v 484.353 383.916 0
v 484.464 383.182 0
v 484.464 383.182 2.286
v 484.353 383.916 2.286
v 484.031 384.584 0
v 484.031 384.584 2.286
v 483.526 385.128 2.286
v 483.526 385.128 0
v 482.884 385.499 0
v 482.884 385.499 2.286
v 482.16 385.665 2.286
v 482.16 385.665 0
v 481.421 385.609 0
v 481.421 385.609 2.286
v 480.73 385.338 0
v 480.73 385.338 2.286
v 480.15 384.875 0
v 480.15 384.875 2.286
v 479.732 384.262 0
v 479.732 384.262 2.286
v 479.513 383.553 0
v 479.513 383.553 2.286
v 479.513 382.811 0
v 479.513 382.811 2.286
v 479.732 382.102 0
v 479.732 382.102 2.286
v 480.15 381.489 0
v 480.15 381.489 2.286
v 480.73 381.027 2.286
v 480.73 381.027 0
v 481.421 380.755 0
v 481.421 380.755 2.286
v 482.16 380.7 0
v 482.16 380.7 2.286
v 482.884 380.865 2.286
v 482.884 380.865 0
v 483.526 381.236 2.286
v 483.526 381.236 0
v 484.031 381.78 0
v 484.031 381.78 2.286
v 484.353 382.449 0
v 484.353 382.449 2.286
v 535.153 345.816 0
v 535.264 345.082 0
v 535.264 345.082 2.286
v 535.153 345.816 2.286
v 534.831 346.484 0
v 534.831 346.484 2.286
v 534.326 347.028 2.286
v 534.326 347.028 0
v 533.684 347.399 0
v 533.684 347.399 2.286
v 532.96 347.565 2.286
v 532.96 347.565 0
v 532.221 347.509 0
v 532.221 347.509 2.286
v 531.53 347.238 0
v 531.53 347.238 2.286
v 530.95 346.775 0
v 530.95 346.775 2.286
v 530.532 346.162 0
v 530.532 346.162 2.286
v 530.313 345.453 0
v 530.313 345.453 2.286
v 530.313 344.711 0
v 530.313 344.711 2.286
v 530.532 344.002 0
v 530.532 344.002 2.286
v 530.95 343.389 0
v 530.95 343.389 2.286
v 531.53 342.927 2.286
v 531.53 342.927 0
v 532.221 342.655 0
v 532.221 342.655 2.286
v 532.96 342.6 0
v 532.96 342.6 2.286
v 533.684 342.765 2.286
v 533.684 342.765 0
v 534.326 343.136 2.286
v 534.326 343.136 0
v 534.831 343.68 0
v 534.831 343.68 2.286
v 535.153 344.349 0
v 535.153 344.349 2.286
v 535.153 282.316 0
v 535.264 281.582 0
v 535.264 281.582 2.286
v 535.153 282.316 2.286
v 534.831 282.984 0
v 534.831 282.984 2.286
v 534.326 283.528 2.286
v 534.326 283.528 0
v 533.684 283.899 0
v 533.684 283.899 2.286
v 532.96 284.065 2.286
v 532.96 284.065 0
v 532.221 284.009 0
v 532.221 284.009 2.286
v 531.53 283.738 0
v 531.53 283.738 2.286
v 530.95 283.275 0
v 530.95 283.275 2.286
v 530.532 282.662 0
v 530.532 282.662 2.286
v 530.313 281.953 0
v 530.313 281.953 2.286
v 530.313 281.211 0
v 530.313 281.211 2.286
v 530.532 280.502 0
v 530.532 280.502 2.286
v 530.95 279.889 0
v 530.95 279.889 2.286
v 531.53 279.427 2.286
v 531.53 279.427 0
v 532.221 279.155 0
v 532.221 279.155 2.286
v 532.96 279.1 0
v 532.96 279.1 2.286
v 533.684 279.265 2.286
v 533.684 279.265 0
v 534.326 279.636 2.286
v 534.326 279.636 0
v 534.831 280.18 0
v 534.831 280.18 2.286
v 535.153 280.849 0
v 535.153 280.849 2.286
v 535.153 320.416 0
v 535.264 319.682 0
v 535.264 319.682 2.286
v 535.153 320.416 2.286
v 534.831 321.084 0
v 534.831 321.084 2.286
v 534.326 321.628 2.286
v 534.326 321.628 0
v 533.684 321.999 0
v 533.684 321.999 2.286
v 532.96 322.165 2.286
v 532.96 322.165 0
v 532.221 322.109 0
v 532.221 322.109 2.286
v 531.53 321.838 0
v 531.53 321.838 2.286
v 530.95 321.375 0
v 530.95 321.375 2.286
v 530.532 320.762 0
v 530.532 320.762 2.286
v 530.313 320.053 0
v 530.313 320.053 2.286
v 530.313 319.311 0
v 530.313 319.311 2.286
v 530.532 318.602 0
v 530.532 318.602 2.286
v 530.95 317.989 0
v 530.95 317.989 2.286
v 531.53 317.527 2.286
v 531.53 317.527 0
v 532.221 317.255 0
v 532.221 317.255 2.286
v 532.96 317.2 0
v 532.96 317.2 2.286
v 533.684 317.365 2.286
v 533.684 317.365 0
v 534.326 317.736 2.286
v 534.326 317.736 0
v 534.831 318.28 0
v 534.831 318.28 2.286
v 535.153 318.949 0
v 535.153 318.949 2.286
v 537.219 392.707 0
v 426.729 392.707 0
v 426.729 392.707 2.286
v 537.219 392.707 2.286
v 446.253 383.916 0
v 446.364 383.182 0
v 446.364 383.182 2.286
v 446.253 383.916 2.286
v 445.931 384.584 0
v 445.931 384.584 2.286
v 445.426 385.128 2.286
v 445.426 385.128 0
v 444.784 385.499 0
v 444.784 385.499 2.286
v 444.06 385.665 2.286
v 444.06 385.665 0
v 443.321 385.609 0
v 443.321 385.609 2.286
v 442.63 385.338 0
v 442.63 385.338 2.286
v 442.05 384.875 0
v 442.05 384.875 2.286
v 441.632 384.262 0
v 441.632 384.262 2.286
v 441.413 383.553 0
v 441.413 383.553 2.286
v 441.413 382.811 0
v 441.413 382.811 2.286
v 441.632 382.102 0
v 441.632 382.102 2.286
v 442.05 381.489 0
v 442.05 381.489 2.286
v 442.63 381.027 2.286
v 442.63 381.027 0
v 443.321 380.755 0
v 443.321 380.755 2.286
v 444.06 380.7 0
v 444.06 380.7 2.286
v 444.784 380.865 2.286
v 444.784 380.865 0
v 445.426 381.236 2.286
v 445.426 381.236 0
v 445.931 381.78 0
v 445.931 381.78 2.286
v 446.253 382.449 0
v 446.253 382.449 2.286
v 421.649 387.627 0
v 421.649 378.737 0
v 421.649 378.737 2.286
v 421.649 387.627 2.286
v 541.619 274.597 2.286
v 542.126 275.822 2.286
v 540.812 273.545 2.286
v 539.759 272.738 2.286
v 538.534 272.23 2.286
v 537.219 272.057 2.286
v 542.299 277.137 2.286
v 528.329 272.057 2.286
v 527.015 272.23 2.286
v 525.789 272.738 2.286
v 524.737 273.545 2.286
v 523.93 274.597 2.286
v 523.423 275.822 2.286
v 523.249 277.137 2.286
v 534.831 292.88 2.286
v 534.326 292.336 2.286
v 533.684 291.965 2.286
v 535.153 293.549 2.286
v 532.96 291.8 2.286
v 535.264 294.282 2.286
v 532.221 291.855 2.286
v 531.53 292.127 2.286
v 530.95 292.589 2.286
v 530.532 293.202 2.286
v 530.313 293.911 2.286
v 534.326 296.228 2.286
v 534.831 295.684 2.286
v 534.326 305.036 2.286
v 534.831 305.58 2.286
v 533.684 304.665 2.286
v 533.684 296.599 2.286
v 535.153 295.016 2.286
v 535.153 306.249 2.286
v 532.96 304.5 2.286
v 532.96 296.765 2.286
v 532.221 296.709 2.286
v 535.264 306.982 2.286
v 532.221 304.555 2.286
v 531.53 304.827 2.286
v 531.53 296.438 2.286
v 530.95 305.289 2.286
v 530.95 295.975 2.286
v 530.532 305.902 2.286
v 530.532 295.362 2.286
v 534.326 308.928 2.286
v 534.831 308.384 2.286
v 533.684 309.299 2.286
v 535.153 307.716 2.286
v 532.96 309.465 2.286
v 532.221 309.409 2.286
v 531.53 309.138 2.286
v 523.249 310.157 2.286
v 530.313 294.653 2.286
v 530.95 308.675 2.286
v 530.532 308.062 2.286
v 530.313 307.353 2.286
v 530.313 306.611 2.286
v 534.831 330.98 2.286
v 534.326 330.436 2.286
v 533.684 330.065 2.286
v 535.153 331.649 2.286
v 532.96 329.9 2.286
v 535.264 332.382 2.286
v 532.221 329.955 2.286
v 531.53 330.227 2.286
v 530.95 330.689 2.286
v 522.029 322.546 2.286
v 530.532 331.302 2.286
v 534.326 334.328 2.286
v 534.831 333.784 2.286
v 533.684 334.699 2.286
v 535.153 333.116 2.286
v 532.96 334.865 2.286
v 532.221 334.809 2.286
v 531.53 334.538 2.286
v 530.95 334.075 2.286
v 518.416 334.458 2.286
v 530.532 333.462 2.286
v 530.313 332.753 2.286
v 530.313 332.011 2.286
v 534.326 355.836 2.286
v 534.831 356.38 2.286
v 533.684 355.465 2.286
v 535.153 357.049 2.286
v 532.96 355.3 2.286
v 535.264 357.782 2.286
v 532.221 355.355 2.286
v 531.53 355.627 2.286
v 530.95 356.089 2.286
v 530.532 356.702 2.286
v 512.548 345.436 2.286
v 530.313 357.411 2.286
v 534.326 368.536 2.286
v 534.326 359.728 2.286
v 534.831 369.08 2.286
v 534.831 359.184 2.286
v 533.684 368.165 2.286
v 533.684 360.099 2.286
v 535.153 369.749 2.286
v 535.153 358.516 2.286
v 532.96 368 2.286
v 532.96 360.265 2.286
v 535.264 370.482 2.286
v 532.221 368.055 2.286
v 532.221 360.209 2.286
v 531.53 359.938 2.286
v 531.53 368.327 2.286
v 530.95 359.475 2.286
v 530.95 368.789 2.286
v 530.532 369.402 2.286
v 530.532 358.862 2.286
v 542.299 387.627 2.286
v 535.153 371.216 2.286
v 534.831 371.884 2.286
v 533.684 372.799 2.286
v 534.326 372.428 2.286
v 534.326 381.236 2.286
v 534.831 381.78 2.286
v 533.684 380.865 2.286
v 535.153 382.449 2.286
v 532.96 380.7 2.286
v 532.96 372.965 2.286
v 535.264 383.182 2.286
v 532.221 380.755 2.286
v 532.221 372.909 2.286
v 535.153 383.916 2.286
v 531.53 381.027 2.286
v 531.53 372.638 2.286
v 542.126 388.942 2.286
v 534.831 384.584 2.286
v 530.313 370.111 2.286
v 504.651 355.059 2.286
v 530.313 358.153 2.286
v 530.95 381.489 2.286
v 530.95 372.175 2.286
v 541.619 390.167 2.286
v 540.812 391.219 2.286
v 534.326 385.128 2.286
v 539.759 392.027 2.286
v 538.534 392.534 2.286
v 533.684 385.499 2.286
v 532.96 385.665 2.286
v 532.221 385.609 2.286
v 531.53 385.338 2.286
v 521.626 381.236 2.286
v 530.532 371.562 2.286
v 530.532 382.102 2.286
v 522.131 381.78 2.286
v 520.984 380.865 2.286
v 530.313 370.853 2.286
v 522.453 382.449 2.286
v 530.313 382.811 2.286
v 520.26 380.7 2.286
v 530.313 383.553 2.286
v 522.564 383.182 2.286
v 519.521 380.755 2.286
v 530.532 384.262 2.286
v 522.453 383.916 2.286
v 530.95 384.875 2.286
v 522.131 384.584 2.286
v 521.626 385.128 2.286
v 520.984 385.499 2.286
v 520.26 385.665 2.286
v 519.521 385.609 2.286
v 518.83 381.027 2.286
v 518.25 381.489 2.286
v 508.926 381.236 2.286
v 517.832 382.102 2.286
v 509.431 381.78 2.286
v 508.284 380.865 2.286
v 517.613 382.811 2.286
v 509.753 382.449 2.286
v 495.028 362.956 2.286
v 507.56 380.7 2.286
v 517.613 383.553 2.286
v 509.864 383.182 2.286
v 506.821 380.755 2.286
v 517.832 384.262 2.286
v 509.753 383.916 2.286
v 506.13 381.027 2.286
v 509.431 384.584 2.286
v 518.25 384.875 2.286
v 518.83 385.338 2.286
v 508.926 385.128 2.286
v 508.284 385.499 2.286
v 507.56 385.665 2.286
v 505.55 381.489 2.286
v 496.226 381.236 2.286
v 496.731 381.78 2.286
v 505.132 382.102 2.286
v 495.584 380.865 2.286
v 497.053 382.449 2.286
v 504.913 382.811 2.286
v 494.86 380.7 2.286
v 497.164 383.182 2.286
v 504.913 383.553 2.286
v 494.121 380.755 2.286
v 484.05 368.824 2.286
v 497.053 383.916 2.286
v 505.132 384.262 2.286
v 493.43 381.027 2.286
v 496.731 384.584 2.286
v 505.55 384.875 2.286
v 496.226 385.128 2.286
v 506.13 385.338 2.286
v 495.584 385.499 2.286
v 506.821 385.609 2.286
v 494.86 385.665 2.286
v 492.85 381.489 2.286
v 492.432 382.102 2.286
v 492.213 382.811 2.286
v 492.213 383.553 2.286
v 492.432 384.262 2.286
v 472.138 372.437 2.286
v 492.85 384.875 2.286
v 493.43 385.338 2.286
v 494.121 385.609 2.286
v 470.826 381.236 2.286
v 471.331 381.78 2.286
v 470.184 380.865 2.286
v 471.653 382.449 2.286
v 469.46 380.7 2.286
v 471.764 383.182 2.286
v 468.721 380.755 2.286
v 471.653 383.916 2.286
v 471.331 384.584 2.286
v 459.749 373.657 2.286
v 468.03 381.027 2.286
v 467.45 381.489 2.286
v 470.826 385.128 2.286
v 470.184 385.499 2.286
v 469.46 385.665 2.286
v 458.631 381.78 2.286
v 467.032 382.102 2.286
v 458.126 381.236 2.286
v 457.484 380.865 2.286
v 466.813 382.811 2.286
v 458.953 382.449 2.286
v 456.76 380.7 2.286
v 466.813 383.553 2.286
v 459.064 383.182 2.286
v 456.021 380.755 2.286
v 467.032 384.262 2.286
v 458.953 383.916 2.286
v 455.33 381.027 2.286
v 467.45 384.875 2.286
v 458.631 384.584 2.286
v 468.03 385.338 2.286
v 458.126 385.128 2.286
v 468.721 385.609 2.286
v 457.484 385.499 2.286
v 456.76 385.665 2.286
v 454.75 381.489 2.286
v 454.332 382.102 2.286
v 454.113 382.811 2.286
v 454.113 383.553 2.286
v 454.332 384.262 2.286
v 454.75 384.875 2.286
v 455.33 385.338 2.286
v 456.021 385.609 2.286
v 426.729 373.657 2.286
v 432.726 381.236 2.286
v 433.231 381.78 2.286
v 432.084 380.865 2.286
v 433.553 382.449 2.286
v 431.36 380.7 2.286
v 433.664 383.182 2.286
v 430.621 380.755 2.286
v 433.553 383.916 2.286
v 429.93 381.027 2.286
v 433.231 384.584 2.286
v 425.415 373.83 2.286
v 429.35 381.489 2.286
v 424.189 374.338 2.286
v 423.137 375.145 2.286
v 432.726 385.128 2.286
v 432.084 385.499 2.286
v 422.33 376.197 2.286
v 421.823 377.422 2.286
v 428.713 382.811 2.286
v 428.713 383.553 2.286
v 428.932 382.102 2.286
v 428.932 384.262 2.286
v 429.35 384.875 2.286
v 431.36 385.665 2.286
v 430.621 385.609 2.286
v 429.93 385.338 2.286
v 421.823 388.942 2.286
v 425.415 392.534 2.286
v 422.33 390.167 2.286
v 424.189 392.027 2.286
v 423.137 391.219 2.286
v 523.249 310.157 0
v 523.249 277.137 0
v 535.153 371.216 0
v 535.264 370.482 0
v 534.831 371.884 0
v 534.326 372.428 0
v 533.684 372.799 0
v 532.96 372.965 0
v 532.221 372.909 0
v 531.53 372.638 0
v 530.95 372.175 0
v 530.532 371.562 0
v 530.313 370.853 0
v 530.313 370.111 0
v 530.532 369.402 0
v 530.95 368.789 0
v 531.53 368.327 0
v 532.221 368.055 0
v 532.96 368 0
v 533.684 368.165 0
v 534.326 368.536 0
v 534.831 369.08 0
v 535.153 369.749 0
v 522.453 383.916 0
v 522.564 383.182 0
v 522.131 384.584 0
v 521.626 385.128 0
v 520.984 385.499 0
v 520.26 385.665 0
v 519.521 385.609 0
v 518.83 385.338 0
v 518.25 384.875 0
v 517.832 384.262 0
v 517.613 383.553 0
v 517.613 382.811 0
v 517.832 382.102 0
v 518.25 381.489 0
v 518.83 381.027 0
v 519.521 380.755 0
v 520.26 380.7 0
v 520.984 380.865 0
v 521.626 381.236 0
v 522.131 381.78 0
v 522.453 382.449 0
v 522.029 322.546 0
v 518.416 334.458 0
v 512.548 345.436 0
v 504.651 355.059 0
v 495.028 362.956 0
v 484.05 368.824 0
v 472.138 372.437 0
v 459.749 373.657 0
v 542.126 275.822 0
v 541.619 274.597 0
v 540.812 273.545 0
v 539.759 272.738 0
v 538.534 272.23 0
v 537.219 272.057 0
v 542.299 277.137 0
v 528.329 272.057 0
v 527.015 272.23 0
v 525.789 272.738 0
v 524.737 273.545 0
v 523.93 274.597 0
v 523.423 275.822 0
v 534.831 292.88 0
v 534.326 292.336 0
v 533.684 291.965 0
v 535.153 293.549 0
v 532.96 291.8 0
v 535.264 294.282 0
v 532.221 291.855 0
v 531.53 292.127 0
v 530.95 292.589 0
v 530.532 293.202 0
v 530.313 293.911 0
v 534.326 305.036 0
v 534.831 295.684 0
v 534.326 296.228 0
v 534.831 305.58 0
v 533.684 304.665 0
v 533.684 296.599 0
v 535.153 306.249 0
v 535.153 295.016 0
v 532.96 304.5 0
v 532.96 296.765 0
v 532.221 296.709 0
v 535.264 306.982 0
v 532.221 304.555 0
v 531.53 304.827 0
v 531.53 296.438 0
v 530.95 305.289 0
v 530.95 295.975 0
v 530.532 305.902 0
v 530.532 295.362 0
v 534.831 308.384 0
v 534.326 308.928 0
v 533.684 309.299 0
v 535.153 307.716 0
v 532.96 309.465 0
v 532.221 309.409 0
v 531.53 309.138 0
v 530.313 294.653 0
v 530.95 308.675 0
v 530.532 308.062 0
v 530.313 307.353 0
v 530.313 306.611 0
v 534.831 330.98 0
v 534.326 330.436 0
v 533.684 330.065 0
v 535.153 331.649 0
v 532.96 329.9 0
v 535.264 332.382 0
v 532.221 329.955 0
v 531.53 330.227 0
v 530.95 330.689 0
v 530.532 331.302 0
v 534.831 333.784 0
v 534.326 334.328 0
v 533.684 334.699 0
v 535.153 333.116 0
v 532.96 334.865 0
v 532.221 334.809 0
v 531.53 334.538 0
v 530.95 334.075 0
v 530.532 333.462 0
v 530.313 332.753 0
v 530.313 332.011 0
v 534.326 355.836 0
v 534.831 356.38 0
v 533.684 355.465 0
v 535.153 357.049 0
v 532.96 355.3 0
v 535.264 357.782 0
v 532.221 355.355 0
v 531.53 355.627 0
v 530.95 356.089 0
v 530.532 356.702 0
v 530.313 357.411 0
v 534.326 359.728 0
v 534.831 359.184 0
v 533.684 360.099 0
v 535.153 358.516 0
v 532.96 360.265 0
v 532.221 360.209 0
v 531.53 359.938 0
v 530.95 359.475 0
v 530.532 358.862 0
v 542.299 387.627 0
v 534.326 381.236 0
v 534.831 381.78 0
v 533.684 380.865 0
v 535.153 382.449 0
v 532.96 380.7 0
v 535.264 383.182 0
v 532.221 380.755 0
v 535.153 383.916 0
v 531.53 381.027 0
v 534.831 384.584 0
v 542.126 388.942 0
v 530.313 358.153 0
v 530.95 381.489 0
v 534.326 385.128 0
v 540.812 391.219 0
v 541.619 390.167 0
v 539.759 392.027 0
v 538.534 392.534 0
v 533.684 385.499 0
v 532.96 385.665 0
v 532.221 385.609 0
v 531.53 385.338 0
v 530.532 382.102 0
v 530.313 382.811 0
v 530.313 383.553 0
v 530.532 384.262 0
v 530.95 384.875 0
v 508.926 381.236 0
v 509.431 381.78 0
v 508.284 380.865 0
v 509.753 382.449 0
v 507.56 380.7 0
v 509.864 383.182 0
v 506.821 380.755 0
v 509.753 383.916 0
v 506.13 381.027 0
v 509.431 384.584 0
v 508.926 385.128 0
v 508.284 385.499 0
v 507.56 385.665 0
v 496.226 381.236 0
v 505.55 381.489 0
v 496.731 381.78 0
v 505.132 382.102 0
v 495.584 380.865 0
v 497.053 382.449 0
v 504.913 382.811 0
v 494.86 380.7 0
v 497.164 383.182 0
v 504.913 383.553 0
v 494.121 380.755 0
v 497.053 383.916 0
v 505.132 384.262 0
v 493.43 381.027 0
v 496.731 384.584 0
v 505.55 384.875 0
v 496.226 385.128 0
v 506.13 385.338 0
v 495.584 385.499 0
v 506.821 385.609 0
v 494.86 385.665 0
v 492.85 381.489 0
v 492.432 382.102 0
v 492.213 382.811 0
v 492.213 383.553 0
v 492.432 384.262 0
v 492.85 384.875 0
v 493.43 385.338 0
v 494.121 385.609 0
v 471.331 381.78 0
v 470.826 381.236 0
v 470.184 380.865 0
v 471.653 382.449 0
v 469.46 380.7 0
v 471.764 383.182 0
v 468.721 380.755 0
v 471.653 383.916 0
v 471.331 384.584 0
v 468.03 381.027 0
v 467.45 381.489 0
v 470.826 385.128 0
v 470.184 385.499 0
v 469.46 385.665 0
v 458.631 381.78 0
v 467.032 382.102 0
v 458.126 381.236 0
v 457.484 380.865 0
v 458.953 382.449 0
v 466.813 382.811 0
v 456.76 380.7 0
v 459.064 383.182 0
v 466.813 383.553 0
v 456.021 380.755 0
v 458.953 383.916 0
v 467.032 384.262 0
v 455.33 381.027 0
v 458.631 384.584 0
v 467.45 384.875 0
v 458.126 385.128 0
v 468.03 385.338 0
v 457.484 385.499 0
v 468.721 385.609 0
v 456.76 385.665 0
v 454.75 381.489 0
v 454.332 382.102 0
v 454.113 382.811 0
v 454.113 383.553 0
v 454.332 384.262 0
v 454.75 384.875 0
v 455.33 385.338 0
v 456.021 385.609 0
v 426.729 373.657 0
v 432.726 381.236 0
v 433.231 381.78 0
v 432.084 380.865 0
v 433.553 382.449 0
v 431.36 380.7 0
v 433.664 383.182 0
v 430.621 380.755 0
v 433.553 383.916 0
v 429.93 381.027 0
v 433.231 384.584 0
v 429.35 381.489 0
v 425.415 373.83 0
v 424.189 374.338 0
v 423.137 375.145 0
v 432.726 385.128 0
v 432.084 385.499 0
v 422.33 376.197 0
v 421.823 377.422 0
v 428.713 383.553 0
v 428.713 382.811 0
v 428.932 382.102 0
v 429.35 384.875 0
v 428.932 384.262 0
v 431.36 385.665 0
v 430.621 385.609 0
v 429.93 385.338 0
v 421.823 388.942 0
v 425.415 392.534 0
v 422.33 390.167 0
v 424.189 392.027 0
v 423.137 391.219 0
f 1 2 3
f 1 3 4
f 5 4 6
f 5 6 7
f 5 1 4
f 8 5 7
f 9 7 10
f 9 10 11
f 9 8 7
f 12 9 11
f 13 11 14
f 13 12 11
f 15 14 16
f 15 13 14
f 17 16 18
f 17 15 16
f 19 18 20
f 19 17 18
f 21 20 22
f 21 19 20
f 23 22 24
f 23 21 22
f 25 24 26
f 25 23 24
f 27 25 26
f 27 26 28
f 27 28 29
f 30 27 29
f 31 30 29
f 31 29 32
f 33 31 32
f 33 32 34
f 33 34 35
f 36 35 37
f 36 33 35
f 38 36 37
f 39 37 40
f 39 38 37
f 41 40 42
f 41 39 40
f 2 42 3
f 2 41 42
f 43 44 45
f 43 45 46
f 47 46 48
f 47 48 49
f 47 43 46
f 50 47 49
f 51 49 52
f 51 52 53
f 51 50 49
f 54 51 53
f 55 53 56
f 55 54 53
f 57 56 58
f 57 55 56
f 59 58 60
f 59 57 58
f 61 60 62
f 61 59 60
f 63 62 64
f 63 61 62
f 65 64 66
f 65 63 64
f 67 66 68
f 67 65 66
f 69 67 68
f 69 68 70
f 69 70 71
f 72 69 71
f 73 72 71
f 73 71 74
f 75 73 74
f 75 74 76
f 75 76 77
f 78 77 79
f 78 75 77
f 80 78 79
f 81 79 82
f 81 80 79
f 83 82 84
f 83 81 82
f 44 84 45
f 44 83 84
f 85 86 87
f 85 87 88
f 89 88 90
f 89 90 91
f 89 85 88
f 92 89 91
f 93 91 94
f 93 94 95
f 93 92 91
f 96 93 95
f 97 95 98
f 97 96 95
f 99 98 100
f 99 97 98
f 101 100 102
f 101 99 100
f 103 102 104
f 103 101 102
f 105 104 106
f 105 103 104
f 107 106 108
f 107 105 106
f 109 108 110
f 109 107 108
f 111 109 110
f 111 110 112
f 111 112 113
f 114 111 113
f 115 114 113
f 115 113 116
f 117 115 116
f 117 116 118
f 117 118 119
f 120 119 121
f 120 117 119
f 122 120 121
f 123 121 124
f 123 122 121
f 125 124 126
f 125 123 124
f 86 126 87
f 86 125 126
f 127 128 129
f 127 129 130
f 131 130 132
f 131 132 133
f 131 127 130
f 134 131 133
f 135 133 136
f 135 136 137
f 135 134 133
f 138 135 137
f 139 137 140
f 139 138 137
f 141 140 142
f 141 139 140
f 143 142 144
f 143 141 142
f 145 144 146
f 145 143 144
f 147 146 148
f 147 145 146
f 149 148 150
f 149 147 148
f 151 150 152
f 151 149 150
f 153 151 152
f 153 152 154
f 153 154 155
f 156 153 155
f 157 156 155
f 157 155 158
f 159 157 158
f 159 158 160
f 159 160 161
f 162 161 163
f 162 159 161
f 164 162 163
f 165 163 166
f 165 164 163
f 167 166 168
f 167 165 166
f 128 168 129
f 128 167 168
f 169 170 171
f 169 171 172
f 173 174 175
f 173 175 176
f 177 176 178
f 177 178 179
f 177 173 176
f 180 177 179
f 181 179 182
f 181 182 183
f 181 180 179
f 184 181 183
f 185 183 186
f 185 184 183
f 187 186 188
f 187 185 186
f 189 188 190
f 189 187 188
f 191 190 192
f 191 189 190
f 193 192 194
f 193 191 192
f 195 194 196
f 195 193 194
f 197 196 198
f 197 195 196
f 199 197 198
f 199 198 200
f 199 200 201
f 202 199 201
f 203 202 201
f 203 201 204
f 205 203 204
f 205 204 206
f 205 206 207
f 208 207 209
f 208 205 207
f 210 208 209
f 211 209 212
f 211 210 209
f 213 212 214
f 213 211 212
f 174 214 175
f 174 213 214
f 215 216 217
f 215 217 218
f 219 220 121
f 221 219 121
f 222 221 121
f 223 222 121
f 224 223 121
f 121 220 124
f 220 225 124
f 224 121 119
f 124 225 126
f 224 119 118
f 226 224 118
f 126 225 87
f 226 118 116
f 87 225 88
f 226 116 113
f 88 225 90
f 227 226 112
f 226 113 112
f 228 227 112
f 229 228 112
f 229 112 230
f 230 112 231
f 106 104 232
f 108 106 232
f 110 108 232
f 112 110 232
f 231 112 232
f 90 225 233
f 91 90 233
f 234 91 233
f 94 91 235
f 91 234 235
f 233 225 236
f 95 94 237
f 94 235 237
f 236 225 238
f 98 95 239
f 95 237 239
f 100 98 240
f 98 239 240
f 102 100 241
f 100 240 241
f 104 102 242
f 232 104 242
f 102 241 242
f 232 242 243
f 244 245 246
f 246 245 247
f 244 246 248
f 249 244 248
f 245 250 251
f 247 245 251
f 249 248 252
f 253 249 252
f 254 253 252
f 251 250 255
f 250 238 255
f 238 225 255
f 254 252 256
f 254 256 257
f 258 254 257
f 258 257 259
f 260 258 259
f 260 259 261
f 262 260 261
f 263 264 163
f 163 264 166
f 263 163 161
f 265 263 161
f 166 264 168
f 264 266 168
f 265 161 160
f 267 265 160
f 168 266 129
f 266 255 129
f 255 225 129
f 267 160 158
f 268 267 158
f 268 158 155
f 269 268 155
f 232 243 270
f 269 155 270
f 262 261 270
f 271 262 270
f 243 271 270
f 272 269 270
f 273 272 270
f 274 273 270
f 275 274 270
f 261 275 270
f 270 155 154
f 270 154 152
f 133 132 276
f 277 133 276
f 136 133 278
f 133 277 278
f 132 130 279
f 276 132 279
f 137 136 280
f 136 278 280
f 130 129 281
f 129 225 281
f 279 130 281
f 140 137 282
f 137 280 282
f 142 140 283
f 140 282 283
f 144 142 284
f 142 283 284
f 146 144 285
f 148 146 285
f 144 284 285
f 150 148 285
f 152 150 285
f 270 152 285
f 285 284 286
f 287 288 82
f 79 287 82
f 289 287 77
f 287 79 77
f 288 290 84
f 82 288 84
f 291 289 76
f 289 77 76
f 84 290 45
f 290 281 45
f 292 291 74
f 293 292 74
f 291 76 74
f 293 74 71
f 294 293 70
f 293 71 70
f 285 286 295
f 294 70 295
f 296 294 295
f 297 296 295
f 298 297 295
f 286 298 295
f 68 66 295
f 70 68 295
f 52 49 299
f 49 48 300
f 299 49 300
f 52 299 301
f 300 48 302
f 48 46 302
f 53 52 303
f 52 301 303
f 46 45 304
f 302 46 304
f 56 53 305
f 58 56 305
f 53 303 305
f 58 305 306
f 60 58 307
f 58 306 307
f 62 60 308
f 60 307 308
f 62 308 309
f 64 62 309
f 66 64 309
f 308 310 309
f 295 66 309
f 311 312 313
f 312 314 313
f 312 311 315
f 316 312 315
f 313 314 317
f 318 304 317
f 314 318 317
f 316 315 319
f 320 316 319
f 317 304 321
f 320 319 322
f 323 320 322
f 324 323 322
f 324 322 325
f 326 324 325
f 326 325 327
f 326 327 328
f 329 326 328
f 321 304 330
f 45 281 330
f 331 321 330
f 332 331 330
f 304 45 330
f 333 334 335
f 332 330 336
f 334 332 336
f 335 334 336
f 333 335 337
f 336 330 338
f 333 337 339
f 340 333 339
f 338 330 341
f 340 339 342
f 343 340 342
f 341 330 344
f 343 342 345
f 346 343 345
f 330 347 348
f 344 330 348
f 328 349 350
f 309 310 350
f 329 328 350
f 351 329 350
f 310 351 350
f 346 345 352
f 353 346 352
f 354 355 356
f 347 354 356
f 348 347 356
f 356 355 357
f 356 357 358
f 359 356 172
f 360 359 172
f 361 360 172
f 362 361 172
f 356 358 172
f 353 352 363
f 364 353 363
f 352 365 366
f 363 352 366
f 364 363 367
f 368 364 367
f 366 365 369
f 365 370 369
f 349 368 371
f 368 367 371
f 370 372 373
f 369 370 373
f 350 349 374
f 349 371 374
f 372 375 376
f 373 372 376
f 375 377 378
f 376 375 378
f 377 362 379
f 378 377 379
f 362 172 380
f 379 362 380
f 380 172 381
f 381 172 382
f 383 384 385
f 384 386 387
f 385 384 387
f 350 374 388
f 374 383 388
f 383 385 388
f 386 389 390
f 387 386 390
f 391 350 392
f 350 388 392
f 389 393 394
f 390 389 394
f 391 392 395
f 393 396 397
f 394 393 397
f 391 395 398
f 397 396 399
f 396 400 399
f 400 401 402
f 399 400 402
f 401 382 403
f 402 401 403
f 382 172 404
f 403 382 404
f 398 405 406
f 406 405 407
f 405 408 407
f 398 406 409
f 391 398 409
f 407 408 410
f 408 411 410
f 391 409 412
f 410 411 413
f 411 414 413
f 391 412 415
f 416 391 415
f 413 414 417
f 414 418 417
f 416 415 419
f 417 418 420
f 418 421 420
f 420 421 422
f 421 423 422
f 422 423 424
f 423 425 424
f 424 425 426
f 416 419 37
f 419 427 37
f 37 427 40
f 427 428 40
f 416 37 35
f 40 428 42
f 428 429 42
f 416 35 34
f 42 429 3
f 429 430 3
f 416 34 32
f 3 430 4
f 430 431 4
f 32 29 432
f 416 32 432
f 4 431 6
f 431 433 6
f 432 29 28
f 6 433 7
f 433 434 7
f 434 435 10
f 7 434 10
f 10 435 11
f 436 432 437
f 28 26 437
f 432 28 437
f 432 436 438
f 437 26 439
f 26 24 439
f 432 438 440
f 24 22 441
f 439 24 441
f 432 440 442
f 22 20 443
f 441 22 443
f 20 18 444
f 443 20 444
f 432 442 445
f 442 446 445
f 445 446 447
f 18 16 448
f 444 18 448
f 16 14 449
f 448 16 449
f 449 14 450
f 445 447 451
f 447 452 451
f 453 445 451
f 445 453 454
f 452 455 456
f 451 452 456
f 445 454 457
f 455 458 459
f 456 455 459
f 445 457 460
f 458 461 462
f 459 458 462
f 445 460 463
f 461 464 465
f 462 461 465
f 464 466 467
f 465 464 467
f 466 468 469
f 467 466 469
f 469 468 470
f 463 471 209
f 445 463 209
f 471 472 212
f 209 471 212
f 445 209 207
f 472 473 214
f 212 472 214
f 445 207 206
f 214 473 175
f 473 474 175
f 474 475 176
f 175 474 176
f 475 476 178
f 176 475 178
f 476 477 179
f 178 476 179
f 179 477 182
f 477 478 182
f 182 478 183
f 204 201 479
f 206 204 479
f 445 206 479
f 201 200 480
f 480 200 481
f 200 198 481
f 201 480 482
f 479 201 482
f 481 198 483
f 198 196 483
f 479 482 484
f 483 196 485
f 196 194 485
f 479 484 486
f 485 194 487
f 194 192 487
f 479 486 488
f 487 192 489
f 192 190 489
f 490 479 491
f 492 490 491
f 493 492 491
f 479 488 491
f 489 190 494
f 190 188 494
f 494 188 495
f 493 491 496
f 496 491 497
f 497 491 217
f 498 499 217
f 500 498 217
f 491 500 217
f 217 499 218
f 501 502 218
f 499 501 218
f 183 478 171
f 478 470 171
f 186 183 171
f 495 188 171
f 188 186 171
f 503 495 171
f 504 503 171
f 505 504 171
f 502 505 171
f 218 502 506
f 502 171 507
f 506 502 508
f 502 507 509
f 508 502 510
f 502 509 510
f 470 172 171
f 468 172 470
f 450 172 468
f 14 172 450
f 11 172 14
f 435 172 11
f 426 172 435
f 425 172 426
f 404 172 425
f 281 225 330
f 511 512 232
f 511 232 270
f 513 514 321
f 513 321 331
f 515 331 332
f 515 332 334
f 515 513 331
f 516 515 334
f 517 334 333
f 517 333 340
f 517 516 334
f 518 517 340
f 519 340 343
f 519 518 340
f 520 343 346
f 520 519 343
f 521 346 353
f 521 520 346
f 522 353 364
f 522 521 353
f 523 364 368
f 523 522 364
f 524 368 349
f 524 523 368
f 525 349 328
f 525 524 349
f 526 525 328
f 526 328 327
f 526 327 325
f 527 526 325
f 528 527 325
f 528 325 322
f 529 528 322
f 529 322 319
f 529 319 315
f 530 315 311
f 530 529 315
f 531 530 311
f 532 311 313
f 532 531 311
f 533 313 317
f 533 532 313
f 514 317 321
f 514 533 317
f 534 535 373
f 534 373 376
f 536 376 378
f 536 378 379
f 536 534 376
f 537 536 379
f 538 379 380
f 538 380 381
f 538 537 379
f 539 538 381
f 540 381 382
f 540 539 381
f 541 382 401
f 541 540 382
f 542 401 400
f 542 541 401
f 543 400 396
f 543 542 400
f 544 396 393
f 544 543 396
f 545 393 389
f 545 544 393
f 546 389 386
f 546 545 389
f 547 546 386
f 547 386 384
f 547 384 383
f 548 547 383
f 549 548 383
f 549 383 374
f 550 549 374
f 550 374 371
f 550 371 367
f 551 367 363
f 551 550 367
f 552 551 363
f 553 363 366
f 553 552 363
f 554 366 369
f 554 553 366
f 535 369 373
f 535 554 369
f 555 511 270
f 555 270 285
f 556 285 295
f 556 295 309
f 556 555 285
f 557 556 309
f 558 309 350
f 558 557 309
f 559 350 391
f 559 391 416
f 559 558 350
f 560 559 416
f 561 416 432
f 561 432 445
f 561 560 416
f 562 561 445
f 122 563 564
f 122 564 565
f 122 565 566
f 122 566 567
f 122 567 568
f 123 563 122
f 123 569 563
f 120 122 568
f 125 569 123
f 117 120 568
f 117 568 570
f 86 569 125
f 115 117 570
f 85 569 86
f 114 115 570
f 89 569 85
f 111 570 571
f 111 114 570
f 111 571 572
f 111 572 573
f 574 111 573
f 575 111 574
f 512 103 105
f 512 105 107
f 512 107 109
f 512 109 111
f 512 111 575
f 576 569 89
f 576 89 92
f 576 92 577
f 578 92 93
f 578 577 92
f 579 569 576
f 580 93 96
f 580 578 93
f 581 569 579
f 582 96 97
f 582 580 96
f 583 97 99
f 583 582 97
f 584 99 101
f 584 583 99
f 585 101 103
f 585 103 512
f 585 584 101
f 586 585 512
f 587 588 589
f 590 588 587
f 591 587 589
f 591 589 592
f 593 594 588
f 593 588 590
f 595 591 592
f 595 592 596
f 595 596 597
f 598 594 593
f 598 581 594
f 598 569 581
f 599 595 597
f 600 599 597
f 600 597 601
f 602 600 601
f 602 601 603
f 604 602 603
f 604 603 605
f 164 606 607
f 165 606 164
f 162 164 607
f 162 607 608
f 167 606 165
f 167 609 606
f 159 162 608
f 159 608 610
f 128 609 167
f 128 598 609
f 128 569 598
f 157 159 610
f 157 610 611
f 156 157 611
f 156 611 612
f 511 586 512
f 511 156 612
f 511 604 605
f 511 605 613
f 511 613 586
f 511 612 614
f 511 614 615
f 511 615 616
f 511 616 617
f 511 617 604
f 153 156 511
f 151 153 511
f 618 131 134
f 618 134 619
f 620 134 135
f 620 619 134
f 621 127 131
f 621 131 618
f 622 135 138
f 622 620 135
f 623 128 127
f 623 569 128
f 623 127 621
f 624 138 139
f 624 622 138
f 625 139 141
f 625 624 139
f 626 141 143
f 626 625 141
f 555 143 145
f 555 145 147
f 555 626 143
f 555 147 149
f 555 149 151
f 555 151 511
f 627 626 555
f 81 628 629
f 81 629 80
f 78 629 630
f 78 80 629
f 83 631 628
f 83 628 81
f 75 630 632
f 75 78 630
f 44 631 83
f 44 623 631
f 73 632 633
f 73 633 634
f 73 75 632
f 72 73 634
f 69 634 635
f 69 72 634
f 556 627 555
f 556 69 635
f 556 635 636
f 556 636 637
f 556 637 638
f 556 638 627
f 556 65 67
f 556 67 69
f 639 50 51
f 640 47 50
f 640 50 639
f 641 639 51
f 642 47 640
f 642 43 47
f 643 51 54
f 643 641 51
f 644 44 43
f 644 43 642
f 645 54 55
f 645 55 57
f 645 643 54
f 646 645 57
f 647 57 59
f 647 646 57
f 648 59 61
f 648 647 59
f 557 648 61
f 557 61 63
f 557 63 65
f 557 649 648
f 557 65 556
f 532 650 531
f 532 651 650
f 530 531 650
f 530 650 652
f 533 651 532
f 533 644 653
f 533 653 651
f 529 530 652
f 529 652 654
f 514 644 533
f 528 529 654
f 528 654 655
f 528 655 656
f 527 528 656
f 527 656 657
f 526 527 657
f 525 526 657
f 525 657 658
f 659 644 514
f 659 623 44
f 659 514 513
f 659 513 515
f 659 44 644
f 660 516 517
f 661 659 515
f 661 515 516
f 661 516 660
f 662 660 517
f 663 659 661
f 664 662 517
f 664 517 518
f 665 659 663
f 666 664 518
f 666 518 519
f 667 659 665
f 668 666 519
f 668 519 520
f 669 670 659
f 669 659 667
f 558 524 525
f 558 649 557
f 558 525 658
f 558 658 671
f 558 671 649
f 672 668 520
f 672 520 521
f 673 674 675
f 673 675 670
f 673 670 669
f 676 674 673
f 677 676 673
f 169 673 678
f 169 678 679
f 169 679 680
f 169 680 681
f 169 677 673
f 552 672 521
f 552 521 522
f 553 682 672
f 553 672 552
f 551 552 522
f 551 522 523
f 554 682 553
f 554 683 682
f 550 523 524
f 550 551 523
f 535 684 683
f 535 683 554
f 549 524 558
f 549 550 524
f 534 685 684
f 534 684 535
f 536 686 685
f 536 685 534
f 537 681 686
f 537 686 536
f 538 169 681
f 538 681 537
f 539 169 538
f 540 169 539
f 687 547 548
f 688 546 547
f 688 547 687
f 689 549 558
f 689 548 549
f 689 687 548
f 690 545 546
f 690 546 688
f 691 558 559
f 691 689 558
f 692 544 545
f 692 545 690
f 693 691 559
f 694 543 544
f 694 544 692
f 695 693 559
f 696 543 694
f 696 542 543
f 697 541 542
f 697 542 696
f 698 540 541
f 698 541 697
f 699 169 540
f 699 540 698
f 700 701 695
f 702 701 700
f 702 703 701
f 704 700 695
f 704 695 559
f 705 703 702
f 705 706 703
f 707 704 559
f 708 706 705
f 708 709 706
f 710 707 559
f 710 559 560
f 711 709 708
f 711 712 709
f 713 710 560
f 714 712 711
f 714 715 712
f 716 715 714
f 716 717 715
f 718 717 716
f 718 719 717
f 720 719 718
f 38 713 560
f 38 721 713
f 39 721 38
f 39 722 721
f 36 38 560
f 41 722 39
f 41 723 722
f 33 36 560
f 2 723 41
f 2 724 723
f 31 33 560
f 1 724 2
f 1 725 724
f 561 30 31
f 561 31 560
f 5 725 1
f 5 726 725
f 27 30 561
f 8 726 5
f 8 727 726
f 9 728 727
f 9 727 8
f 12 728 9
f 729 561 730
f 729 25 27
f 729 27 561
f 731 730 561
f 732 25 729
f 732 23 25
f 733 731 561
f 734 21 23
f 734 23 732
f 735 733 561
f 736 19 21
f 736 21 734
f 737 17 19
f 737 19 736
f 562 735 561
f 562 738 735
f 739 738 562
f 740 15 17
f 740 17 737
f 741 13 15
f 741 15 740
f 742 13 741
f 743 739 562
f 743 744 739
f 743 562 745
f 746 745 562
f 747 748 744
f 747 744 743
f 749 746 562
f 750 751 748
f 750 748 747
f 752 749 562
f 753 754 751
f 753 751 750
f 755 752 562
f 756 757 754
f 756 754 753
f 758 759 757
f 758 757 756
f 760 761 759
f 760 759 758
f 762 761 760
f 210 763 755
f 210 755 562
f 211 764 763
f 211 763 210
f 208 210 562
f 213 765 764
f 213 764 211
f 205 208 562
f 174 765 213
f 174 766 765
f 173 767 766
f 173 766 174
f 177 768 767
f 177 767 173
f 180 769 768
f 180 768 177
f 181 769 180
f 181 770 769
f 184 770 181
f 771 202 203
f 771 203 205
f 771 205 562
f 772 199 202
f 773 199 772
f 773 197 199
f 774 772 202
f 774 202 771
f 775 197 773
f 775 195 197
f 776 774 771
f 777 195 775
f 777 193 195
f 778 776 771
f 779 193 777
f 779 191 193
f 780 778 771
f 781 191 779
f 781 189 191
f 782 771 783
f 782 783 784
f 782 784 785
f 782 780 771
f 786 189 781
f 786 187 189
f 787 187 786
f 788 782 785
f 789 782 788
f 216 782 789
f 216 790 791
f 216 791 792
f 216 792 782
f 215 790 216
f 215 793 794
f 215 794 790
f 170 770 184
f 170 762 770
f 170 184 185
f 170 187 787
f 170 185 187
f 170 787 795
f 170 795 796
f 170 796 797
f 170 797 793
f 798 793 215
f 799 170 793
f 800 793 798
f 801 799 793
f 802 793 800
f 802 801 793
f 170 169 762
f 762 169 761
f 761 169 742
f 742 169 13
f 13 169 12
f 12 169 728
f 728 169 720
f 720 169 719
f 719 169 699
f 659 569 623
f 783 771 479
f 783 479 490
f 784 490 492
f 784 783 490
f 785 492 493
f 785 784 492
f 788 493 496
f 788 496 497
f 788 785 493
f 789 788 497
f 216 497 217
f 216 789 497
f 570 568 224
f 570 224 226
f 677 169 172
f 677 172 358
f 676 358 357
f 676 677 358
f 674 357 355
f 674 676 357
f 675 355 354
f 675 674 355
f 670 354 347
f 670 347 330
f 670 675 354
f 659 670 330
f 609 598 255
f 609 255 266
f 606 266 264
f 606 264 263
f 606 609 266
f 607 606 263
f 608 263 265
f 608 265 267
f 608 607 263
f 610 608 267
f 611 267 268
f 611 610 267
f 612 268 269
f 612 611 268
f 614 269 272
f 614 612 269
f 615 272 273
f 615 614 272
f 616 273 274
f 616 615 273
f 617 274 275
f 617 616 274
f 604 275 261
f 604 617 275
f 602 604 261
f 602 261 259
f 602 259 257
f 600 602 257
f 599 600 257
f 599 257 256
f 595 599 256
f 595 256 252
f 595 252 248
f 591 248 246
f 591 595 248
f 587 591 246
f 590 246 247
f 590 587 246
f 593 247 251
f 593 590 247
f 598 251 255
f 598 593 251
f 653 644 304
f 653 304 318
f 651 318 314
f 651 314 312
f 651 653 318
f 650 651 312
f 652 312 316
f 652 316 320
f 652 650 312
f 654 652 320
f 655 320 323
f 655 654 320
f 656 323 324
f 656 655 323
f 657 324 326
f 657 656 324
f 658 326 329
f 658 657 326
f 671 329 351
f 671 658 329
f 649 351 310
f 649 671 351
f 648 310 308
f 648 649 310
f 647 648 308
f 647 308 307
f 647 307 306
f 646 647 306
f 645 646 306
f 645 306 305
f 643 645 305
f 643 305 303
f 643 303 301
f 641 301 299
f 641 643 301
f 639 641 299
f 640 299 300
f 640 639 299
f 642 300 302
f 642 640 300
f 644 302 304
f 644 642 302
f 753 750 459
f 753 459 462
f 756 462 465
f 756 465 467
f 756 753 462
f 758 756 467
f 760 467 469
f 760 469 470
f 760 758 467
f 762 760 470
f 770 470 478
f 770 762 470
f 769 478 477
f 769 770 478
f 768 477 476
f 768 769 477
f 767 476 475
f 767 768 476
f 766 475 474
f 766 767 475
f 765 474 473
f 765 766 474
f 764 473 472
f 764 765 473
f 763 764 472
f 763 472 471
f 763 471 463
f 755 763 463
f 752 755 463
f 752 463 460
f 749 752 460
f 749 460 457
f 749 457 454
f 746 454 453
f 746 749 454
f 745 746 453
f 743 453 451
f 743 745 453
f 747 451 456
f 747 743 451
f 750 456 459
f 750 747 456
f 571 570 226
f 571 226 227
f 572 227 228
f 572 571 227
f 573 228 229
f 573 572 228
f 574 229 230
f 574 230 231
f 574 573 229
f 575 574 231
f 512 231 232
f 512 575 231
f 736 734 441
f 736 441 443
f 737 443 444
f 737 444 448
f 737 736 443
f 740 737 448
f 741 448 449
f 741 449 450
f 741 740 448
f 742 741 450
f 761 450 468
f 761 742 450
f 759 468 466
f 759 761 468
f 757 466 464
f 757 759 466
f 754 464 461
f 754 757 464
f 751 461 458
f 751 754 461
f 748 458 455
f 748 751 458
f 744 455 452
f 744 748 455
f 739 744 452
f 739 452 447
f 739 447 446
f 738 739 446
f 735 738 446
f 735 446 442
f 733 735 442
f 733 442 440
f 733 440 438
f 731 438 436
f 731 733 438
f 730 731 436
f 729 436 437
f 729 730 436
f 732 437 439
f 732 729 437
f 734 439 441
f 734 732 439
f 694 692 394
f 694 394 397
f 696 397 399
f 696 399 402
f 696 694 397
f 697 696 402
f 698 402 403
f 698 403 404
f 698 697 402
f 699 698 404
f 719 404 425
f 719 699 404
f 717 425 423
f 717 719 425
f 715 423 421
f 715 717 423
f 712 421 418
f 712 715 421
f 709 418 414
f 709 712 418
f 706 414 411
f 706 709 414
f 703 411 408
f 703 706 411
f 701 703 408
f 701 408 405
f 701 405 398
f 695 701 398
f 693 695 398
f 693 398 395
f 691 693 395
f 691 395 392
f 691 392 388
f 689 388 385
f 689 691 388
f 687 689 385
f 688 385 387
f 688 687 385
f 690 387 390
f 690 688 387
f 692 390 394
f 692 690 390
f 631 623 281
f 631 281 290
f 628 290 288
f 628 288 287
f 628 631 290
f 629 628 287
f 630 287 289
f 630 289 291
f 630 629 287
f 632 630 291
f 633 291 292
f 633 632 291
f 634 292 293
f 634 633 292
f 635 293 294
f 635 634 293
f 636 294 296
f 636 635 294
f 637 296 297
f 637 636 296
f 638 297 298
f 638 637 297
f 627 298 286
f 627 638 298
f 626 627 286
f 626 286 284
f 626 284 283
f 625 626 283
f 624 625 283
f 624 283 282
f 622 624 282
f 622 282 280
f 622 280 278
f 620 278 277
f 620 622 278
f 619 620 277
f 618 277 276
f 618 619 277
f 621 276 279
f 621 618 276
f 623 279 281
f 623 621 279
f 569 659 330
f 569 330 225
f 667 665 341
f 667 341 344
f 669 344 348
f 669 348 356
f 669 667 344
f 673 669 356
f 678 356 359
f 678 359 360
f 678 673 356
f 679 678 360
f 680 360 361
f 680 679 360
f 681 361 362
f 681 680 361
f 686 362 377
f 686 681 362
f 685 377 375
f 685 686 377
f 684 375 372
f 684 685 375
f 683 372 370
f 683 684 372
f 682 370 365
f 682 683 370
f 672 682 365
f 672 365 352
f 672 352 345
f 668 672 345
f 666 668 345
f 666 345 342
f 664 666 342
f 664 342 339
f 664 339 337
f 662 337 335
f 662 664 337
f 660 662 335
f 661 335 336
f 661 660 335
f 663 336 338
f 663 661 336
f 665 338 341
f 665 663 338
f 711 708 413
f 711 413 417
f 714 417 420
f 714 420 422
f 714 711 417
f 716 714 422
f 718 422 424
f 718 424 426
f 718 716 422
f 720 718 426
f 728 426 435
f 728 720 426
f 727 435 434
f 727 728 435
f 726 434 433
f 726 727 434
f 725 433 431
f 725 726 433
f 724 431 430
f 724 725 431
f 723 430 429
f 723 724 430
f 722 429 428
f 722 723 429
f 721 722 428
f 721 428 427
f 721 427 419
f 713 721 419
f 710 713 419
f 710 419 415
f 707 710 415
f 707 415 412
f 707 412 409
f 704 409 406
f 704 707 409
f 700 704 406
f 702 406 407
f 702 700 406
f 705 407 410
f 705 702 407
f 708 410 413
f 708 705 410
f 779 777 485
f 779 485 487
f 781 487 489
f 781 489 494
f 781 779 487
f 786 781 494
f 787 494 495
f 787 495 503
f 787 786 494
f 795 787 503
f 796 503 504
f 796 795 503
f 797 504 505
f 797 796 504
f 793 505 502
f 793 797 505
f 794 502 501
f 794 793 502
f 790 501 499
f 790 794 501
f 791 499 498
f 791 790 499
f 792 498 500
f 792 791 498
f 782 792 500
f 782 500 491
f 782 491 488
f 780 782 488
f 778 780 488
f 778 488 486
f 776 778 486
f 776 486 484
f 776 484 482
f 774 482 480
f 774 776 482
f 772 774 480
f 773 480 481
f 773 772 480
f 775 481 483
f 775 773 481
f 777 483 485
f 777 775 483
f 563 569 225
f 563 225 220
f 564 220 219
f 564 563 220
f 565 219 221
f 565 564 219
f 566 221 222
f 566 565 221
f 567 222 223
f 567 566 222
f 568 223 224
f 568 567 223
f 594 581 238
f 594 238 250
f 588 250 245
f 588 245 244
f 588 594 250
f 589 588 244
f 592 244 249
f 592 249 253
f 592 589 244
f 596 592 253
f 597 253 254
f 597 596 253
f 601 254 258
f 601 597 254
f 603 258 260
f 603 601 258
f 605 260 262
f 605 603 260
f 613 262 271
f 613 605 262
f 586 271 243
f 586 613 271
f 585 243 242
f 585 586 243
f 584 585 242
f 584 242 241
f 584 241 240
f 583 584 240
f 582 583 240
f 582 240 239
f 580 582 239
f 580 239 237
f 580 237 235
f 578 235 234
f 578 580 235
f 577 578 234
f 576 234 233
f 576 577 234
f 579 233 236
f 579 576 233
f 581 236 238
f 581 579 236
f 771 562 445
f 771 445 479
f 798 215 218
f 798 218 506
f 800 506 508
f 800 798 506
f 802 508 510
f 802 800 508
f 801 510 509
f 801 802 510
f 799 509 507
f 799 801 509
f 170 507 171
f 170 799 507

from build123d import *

# Parameters (mm, degrees)
SKETCH1_R           = 2.4892
BOSS_EXTRUDE1_DEPTH = 2.286


with BuildPart() as part:
    # Sketch1 → Boss-Extrude1 (new body)
    with BuildSketch(Plane.XY):
        with BuildLine():
            Line((459.749472964, 373.657281044), (426.729472964, 373.657281044))
            ThreePointArc((426.729472964, 373.657281044), (423.137370515, 375.145178596), (421.649472964, 378.737281044))
            Line((421.649472964, 378.737281044), (421.649472964, 387.627281044))
            ThreePointArc((421.649472964, 387.627281044), (423.137370515, 391.219383493), (426.729472964, 392.707281044))
            Line((426.729472964, 392.707281044), (537.219472964, 392.707281044))
            ThreePointArc((537.219472964, 392.707281044), (540.811575412, 391.219383493), (542.299472964, 387.627281044))
            Line((542.299472964, 387.627281044), (542.299472964, 277.137281044))
            ThreePointArc((542.299472964, 277.137281044), (540.811575412, 273.545178596), (537.219472964, 272.057281044))
            Line((537.219472964, 272.057281044), (528.329472964, 272.057281044))
            ThreePointArc((528.329472964, 272.057281044), (524.737370515, 273.545178596), (523.249472964, 277.137281044))
            Line((523.249472964, 277.137281044), (523.249472964, 310.157281044))
            ThreePointArc((523.249472964, 310.157281044), (504.650753569, 355.05856165), (459.749472964, 373.657281044))
        make_face()
        with Locations((431.174472964, 383.182281044)):
            Circle(SKETCH1_R, mode=Mode.SUBTRACT)
        with Locations((443.874472964, 383.182281044)):
            Circle(SKETCH1_R, mode=Mode.SUBTRACT)
        with Locations((456.574472964, 383.182281044)):
            Circle(SKETCH1_R, mode=Mode.SUBTRACT)
        with Locations((469.274472964, 383.182281044)):
            Circle(SKETCH1_R, mode=Mode.SUBTRACT)
        with Locations((481.974472964, 383.182281044)):
            Circle(SKETCH1_R, mode=Mode.SUBTRACT)
        with Locations((494.674472964, 383.182281044)):
            Circle(SKETCH1_R, mode=Mode.SUBTRACT)
        with Locations((507.374472964, 383.182281044)):
            Circle(SKETCH1_R, mode=Mode.SUBTRACT)
        with Locations((520.074472964, 383.182281044)):
            Circle(SKETCH1_R, mode=Mode.SUBTRACT)
        with Locations((532.774472964, 383.182281044)):
            Circle(SKETCH1_R, mode=Mode.SUBTRACT)
        with Locations((532.774472964, 370.482281044)):
            Circle(SKETCH1_R, mode=Mode.SUBTRACT)
        with Locations((532.774472964, 357.782281044)):
            Circle(SKETCH1_R, mode=Mode.SUBTRACT)
        with Locations((532.774472964, 345.082281044)):
            Circle(SKETCH1_R, mode=Mode.SUBTRACT)
        with Locations((532.774472964, 332.382281044)):
            Circle(SKETCH1_R, mode=Mode.SUBTRACT)
        with Locations((532.774472964, 319.682281044)):
            Circle(SKETCH1_R, mode=Mode.SUBTRACT)
        with Locations((532.774472964, 306.982281044)):
            Circle(SKETCH1_R, mode=Mode.SUBTRACT)
        with Locations((532.774472964, 294.282281044)):
            Circle(SKETCH1_R, mode=Mode.SUBTRACT)
        with Locations((532.774472964, 281.582281044)):
            Circle(SKETCH1_R, mode=Mode.SUBTRACT)
    extrude(amount=BOSS_EXTRUDE1_DEPTH)


solid = part.part
